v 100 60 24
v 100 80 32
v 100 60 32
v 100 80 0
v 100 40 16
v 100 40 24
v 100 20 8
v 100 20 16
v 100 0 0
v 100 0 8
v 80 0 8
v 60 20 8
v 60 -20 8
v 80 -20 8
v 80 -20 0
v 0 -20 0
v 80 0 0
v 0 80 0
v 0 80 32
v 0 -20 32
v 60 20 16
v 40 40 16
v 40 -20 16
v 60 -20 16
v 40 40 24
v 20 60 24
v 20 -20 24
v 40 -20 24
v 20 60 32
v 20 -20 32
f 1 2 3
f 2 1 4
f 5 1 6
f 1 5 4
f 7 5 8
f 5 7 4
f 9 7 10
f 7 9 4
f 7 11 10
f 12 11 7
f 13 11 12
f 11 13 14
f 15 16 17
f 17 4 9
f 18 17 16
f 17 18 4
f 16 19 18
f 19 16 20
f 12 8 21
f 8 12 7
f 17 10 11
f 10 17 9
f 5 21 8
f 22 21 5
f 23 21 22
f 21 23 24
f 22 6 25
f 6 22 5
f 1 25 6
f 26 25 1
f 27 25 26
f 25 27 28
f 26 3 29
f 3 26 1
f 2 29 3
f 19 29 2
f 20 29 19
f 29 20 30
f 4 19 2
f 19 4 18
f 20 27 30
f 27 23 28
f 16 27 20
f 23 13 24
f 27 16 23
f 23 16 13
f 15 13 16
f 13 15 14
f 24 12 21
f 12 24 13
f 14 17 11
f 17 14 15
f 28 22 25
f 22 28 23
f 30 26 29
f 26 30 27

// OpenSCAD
/*[global]*/

/* [dimensions] */
number_steps = 4;
//height of each step 
step_z = 8;
//minimum length of each step (+fencing). might be longer if step_y*number_steps > min_step_x 
min_step_x = 100;
//depth of each step (+fencing)
step_y = 20; 
   
step_x = (step_y*number_steps > min_step_x) ? step_y*number_steps: min_step_x;
is_extended = step_x > min_step_x;


/* [fencing]*/
add_front_fencing = 0; //[0:false,1:true]
add_left_fencing = 0; //[0:false,1:true]
add_right_fencing = 0; //[0:false,1:true] 
rounded_fencing = 1; //[0:false,1:true]
fence_thickness = 2;
fence_height = 2;

fence_radius = fence_thickness/2;

/*[gutter]*/
add_gutter = 0 ; //[0:false,1:true]
gutter_radius = 2;
add_y_gutter = 0; //[0:false,1:true]
number_y_gutter = 5; 
gutter_gap =3;

corner_stairs();

module corner_stairs(){
     
    total_y = number_steps*step_y;
    x_y_diff = total_y-step_x;
    
    //right stairs   
    stairs_w_gutter(false);  
    //left stairs
    rotate([0,0,90])
    translate([x_y_diff,-total_y,0])
    stairs_w_gutter(true); 
}
 
module stairs_w_gutter(is_left){
if(add_gutter){ 
    difference() {
        stairs(is_left);
        
        for ( i = [0: number_steps]){ 
            
            translated_y = (i ) * step_y; 
            translate([gutter_gap, translated_y, 0]){ 
                spacerX();
            }
        }  
        if(add_y_gutter){ 
            spacing = step_x / number_y_gutter;
            height = number_steps * step_y;
        
            for ( i = [0: number_y_gutter]){ 
                
            translated_x = (i ) * spacing; 
                translate([translated_x, gutter_gap, 0]){ 
                     
                        spacerY(height);
                     
                }
            }
        }
    }
}else{
    stairs(is_left); 
}
}
 


module stairs(is_left){ 
    for ( i = [1: number_steps]){ 
     
     stairs_y = (i-1) * step_y;
     height = i * step_z;  
        translate([0, stairs_y, 0]){ 
            cube([step_x, step_y, height]); 
            
           fencing(i, is_left, height);
        }    
    }
}

/*FENCING RELATED*/
module fencing(i, is_left, height){
    total_height = fence_height+height ; 
    if(add_front_fencing){
        if(i>1 || !is_extended)
        front_fence(i, total_height, is_left);
    }
    if(add_left_fencing && is_left){
        side_fence(total_height);
    }
    if(add_right_fencing && !is_left){
        translate([step_x-fence_thickness,0,0])
        side_fence(total_height);
    }
}

module front_fence(index, total_height, is_left){
     
    x_offset = (number_steps+1 -index)*step_y;
    
    if(rounded_fencing){
          
        height_offset =total_height-fence_radius;  
        if(is_left){
            left_offset = add_left_fencing? fence_radius :0; 
            length  =  step_x-x_offset+fence_radius - left_offset;
            
            
            translate([left_offset,0,0]){
                
                //bottom_fence
                cube ([length,fence_thickness, height_offset]);
                //top fence
                translate([0,fence_radius, height_offset])
                rotate([0,90,0])
                cylinder(d=fence_thickness,h= length);
            }
        }else { 
            right_offset = add_right_fencing? fence_radius :0; 
            length  =  step_x-x_offset+fence_radius - right_offset;
            
            shift = step_x-length-right_offset;
            translate([shift,0,0]){ 
                cube ([length,fence_thickness, height_offset]);
                
                //top fence
                translate([0,fence_radius, height_offset])
                rotate([0,90,0])
                cylinder(d=fence_thickness,h= length);
            }
            
            //corner post 
            translate([shift,fence_radius,0]){
            cylinder(d=fence_thickness, h=height_offset );
                translate([0,0,height_offset])
                sphere(d=fence_thickness);
            }
        }
         
    } else{
        
        
            x_length =  
                step_x-x_offset + fence_thickness;
            if(is_left){
                cube([x_length,  fence_thickness, total_height]);
            }else{
                translate([step_x-x_length,0,0])
                cube([x_length,  fence_thickness, total_height]);
            }
        
        
    }
}

module side_fence(total_height){
    if(rounded_fencing){ 
        height_offset =total_height-fence_radius;
        translate([fence_radius ,fence_radius, height_offset]){
            //top round portion
            rotate([-90,0,0])
            cylinder(d=fence_thickness,h= step_y-fence_radius);
            //corner sphere
            sphere(d=fence_thickness);
            
        }
        //bottom fence
        translate([0,fence_radius,0])
        cube([fence_thickness, step_y-fence_radius, height_offset]);
        //corner post
        translate([fence_radius,fence_radius,0])
        cylinder(d=fence_thickness, h=height_offset);
        
    }else {
       cube([fence_thickness, step_y, total_height]);
    }
    
}

/*GUTTER RELATED*/
module spacerX(){  
    rotate([0,90,0]){ 
        cylinder( step_x-2*gutter_gap, gutter_radius, gutter_radius);
        
    } 
}

module spacerY(height){  
    rotate([-90,0,0]){ 
        cylinder( height-2*gutter_gap, gutter_radius, gutter_radius);
         
    } 
}
 
   
